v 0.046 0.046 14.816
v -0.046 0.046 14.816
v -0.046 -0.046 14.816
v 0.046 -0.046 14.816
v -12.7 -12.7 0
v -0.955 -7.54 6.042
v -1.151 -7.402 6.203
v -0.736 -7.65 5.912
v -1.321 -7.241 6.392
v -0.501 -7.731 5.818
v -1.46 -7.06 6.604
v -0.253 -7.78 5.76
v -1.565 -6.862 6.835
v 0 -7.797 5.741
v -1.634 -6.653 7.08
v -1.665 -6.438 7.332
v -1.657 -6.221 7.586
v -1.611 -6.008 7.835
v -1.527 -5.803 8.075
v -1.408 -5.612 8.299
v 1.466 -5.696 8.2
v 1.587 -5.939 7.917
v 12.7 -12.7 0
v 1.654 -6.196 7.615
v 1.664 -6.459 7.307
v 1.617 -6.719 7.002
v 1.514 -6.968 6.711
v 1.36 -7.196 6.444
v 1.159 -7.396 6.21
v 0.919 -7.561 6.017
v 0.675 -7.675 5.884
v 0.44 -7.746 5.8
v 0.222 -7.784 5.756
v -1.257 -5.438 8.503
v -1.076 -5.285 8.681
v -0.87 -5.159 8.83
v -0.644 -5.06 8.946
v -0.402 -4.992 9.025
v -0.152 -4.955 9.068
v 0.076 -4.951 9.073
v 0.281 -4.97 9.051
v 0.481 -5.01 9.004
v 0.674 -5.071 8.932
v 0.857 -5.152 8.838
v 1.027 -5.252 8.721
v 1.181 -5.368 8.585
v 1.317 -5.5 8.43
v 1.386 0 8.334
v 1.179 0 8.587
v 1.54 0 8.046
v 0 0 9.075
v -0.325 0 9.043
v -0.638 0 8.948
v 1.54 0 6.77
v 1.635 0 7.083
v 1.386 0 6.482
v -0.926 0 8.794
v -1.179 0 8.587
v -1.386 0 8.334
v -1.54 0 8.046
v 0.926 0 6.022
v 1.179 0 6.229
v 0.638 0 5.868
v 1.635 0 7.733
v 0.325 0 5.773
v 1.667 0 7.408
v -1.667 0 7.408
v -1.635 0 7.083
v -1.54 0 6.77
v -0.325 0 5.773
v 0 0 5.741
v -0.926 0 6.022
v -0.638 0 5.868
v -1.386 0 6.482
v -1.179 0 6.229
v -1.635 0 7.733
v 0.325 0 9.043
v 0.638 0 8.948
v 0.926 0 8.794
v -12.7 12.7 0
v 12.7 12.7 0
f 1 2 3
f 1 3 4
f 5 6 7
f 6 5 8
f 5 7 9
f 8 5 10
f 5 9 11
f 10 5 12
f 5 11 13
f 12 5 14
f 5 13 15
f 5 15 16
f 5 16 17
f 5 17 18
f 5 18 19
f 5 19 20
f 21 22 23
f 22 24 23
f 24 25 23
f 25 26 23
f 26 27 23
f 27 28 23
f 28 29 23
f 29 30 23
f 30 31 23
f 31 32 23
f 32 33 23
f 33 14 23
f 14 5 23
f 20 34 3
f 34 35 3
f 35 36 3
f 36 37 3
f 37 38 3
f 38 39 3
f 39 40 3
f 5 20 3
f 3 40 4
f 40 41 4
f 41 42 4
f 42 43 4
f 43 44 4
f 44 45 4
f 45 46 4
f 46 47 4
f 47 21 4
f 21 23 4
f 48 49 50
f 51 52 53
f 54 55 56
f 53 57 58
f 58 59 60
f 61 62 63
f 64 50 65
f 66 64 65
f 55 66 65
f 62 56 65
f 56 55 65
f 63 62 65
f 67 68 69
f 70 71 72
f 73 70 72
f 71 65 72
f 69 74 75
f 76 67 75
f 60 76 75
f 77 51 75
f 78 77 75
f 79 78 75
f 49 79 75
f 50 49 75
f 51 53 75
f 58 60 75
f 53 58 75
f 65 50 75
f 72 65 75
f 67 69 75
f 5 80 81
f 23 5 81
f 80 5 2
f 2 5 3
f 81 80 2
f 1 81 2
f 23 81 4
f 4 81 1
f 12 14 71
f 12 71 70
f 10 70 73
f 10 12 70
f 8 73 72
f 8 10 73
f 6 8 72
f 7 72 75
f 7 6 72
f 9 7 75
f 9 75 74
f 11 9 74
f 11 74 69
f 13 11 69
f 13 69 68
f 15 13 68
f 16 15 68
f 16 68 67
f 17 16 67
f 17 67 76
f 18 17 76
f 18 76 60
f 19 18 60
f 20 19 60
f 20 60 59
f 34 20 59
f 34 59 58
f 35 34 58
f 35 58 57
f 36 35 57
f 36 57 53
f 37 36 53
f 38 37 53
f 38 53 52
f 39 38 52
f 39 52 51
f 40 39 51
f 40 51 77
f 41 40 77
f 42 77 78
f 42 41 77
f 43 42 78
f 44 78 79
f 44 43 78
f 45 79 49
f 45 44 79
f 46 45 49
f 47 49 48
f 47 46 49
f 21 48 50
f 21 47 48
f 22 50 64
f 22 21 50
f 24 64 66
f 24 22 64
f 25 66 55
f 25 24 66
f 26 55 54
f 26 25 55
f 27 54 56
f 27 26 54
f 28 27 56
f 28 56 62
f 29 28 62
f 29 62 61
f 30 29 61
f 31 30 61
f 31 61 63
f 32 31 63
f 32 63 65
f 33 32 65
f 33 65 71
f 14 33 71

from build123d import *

# Parameters (mm, degrees)
ESQUISSE1_W             = 25.4
ESQUISSE1_H             = 25.4
BOSS_EXTRU_1_DEPTH      = 14.81582
BOSS_EXTRU_1_TAPER      = 40.5
ESQUISSE2_R             = 1.666875
ENL_V_MAT_EXTRU_1_DEPTH = 12.7


with BuildPart() as part:
    # Esquisse1 → Boss.-Extru.1 (new body)
    with BuildSketch(Plane.XY):
        Rectangle(ESQUISSE1_W, ESQUISSE1_H)
    extrude(amount=BOSS_EXTRU_1_DEPTH, taper=BOSS_EXTRU_1_TAPER)

    # Esquisse2 → Enlèv. mat.-Extru.1 (cut)
    with BuildSketch(Plane(origin=(0, -12.7, 0), x_dir=(1, 0, 0), z_dir=(0, 1, 0))):
        with Locations(Location((0, -7.40791, 0), (0, 0, 90))):
            Circle(ESQUISSE2_R)
    extrude(amount=ENL_V_MAT_EXTRU_1_DEPTH, mode=Mode.SUBTRACT)


solid = part.part
